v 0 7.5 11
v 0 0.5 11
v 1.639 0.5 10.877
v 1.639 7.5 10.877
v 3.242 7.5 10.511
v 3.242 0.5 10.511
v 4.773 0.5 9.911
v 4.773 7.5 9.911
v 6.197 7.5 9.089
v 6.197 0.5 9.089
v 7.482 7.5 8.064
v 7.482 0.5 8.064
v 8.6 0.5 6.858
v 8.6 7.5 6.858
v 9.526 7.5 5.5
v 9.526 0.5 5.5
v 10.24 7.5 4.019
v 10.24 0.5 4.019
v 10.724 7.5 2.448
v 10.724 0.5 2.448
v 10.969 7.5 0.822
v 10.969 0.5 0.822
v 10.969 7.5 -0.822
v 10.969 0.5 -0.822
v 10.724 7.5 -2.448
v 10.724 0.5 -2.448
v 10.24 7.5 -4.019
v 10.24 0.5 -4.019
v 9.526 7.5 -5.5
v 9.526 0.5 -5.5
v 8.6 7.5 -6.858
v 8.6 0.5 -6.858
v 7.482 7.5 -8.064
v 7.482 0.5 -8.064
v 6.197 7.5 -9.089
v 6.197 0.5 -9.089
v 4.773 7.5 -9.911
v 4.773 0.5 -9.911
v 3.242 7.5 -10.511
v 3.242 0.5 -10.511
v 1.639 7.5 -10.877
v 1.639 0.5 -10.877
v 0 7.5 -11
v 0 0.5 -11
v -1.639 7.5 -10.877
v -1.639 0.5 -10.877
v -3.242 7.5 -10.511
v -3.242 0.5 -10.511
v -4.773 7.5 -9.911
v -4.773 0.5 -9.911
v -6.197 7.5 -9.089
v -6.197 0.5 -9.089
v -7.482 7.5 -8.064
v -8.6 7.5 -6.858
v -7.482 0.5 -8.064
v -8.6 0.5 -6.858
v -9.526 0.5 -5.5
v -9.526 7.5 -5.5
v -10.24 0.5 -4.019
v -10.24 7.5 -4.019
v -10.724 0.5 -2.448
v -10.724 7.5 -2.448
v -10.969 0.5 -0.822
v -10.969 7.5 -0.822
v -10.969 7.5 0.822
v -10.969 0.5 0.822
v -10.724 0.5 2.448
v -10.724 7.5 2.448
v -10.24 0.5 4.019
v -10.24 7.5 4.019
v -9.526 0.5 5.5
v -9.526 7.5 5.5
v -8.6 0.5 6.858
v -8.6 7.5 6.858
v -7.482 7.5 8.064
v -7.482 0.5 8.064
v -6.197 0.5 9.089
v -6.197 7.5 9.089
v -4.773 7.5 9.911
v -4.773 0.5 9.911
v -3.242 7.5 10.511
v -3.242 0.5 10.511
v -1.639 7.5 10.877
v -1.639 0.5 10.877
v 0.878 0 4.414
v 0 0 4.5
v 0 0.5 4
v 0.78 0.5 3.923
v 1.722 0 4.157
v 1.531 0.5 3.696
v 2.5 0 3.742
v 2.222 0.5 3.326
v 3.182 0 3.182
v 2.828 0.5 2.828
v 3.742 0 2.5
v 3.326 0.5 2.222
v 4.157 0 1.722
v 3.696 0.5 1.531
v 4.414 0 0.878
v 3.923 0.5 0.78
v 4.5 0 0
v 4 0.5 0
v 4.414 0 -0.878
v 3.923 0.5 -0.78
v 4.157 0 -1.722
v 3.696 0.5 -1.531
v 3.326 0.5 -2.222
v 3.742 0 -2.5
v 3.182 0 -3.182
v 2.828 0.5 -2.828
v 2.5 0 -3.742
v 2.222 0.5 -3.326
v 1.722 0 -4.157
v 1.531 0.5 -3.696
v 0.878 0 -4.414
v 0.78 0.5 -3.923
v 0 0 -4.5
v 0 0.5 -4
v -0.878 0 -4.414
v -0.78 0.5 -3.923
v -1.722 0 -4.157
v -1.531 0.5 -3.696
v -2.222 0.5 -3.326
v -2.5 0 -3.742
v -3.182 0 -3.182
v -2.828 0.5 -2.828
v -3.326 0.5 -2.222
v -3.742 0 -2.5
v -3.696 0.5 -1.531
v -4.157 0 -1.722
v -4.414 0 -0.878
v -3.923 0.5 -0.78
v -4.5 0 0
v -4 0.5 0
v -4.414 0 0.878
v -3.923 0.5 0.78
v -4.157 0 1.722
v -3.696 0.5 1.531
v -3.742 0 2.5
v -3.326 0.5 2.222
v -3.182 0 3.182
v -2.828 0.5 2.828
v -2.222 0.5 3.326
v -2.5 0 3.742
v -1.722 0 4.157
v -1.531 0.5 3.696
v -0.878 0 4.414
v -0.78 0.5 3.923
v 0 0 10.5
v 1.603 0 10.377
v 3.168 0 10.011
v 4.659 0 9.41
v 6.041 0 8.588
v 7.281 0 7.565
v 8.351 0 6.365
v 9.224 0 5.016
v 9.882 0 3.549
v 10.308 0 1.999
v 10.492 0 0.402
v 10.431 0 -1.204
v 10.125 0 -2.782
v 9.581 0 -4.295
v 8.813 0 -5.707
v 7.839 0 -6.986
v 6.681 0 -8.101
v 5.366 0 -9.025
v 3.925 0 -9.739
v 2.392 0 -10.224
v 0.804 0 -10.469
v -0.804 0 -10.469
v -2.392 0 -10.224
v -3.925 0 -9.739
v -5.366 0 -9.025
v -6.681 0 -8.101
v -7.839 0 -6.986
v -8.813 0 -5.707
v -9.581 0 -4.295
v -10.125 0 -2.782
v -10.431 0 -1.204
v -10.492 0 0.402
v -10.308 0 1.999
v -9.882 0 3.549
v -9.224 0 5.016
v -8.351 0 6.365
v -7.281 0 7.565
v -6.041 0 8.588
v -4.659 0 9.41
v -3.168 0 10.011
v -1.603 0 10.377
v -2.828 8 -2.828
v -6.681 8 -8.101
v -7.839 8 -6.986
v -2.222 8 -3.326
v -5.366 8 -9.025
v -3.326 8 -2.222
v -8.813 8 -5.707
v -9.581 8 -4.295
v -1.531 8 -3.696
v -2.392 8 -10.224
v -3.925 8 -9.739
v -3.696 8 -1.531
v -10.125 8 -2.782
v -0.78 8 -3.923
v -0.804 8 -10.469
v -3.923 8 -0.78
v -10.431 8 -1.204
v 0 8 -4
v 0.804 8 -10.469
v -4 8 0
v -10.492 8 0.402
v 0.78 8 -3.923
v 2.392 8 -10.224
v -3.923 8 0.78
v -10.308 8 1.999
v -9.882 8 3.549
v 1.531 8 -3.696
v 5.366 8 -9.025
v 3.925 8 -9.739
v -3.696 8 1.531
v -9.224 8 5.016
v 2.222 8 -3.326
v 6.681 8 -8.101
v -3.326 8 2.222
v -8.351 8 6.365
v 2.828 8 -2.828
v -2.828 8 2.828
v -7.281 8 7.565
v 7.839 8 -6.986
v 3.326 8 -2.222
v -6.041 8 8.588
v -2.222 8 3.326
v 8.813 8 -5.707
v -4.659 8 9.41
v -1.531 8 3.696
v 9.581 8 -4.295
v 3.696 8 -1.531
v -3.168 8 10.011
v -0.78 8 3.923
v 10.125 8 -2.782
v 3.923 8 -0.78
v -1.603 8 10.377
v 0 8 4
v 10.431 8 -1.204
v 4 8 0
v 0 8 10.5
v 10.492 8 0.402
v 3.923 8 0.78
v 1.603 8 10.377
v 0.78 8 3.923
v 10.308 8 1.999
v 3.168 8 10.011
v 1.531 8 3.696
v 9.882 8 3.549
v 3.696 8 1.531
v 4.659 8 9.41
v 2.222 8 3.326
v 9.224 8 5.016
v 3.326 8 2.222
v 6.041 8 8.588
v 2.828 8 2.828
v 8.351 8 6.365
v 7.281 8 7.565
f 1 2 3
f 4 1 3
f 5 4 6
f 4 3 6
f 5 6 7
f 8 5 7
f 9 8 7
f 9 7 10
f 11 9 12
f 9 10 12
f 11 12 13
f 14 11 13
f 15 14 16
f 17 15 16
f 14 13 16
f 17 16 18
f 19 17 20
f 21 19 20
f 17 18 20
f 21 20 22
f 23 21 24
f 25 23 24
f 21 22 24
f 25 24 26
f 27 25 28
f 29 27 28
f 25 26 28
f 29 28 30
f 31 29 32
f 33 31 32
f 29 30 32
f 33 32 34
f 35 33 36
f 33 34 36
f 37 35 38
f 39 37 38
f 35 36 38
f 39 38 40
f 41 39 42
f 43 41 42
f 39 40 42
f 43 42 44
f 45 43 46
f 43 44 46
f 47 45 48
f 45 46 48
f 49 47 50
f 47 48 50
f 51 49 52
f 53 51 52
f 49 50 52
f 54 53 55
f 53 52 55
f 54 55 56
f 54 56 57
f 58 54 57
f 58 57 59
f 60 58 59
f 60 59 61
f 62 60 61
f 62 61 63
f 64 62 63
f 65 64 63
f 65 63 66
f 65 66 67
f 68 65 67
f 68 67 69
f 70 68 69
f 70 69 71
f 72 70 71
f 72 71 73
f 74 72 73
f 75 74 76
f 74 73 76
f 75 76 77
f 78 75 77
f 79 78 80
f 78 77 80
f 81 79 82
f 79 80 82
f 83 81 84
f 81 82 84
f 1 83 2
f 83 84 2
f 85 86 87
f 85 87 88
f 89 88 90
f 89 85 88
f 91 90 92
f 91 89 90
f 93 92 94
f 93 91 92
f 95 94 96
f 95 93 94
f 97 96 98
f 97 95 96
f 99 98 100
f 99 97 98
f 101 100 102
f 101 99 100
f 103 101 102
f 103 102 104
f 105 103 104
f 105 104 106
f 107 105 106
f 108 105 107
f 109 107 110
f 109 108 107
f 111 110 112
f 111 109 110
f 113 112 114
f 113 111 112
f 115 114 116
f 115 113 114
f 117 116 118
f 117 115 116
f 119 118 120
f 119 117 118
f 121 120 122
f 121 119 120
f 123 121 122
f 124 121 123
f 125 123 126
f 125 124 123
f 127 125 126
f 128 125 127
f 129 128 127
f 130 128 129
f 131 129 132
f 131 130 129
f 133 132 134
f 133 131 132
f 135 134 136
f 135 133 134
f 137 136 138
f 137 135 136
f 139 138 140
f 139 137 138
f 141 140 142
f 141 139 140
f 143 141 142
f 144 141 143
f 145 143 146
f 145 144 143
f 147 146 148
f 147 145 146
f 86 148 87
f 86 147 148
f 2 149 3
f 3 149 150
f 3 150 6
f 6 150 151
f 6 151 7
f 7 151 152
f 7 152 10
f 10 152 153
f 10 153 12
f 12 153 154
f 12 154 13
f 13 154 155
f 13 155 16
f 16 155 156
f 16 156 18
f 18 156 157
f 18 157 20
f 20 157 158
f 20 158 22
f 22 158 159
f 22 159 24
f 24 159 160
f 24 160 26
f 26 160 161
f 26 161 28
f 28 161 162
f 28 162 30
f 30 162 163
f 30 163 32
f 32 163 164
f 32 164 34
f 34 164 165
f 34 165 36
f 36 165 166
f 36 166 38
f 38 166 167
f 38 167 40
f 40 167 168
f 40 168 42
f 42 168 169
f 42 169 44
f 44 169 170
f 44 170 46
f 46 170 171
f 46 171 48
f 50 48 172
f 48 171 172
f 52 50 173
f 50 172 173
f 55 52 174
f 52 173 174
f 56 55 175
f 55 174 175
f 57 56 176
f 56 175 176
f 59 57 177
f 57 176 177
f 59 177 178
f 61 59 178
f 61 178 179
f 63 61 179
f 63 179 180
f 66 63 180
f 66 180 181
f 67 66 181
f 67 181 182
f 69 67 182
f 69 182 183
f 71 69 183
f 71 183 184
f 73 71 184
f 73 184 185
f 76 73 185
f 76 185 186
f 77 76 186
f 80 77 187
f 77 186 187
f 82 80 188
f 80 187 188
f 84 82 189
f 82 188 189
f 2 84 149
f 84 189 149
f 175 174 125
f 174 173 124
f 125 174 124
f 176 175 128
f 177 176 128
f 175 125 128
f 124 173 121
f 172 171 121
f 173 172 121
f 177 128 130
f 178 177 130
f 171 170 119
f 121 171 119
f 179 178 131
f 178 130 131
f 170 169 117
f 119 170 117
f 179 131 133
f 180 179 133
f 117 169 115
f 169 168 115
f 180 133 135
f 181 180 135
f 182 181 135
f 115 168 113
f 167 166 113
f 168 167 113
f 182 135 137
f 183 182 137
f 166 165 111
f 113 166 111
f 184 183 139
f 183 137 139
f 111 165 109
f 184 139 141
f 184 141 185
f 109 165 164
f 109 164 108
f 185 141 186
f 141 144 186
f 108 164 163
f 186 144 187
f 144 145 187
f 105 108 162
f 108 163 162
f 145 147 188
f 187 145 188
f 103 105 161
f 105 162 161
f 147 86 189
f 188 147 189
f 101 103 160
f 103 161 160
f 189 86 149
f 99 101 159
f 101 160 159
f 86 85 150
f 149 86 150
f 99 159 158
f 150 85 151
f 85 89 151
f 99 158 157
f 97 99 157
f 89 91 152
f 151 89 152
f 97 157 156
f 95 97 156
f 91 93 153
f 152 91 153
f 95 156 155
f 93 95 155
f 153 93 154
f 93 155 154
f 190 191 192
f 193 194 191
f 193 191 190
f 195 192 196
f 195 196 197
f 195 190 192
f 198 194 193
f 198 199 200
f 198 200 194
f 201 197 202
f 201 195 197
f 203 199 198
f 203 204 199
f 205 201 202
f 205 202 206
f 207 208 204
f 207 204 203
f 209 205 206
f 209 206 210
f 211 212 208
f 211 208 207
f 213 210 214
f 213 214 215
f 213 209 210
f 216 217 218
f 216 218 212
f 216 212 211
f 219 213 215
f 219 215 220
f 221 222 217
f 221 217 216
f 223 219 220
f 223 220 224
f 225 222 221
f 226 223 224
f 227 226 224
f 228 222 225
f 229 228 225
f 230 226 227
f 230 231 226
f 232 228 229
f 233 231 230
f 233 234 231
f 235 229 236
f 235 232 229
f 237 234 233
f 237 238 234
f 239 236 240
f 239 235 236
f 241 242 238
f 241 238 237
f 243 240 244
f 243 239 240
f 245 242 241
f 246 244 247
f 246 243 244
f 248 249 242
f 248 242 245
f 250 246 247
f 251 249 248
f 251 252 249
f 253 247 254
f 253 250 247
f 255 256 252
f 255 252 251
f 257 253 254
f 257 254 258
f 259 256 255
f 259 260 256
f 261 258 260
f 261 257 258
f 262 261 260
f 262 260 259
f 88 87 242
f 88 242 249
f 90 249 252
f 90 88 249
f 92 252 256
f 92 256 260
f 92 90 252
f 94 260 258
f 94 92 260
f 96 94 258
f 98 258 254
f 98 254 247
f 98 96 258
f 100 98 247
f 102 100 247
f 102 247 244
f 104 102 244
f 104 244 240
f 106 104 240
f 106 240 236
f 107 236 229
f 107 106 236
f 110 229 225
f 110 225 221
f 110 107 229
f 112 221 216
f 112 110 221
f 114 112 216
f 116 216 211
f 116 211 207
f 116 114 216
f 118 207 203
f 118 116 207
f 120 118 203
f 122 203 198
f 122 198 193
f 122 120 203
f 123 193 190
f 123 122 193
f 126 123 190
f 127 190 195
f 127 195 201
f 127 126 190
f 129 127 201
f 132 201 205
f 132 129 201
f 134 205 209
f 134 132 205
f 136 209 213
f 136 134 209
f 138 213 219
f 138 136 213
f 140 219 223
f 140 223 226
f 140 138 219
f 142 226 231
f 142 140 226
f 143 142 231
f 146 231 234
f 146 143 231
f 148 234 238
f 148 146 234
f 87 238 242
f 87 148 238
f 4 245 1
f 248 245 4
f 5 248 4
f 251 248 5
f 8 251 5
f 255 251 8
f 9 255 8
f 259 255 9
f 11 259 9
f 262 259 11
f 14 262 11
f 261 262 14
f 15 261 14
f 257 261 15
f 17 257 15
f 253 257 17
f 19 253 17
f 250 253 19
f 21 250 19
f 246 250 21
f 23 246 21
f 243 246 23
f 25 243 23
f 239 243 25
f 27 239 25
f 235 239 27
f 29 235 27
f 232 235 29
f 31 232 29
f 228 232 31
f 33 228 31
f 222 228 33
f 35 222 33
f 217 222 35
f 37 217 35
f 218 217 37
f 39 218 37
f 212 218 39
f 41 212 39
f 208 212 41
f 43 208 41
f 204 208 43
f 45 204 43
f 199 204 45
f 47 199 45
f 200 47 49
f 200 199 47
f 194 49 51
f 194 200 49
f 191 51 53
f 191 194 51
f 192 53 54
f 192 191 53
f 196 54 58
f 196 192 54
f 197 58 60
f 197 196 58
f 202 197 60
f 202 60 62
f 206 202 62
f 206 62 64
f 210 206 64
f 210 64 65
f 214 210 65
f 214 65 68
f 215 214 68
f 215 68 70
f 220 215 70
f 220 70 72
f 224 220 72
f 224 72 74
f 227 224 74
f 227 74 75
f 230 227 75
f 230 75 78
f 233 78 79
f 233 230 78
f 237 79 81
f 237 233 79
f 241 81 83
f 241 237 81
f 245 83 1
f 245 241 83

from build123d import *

# Parameters (mm, degrees)
SKETCH1_R           = 11
SKETCH1_R_2         = 4
BOSS_EXTRUDE1_DEPTH = 8
CHAMFER1_SIZE       = 0.5


with BuildPart() as part:
    # Sketch1 → Boss-Extrude1 (new body)
    with BuildSketch(Plane(origin=(0, 0, 0), x_dir=(1, 0, 0), z_dir=(0, 1, 0))):
        with Locations(Location((0, 0, 0), (0, 0, 270))):
            Circle(SKETCH1_R)
        with Locations(Location((0, 0, 0), (0, 0, 270))):
            Circle(SKETCH1_R_2, mode=Mode.SUBTRACT)
    extrude(amount=BOSS_EXTRUDE1_DEPTH)

    # Chamfer1
    chamfer1_edges = [part.edges().sort_by_distance(p)[0] for p in [
        (0, 0, -11),
        (0, 8, -11),
        (0, 0, -4),
    ]]
    chamfer(chamfer1_edges, length=CHAMFER1_SIZE)


solid = part.part
